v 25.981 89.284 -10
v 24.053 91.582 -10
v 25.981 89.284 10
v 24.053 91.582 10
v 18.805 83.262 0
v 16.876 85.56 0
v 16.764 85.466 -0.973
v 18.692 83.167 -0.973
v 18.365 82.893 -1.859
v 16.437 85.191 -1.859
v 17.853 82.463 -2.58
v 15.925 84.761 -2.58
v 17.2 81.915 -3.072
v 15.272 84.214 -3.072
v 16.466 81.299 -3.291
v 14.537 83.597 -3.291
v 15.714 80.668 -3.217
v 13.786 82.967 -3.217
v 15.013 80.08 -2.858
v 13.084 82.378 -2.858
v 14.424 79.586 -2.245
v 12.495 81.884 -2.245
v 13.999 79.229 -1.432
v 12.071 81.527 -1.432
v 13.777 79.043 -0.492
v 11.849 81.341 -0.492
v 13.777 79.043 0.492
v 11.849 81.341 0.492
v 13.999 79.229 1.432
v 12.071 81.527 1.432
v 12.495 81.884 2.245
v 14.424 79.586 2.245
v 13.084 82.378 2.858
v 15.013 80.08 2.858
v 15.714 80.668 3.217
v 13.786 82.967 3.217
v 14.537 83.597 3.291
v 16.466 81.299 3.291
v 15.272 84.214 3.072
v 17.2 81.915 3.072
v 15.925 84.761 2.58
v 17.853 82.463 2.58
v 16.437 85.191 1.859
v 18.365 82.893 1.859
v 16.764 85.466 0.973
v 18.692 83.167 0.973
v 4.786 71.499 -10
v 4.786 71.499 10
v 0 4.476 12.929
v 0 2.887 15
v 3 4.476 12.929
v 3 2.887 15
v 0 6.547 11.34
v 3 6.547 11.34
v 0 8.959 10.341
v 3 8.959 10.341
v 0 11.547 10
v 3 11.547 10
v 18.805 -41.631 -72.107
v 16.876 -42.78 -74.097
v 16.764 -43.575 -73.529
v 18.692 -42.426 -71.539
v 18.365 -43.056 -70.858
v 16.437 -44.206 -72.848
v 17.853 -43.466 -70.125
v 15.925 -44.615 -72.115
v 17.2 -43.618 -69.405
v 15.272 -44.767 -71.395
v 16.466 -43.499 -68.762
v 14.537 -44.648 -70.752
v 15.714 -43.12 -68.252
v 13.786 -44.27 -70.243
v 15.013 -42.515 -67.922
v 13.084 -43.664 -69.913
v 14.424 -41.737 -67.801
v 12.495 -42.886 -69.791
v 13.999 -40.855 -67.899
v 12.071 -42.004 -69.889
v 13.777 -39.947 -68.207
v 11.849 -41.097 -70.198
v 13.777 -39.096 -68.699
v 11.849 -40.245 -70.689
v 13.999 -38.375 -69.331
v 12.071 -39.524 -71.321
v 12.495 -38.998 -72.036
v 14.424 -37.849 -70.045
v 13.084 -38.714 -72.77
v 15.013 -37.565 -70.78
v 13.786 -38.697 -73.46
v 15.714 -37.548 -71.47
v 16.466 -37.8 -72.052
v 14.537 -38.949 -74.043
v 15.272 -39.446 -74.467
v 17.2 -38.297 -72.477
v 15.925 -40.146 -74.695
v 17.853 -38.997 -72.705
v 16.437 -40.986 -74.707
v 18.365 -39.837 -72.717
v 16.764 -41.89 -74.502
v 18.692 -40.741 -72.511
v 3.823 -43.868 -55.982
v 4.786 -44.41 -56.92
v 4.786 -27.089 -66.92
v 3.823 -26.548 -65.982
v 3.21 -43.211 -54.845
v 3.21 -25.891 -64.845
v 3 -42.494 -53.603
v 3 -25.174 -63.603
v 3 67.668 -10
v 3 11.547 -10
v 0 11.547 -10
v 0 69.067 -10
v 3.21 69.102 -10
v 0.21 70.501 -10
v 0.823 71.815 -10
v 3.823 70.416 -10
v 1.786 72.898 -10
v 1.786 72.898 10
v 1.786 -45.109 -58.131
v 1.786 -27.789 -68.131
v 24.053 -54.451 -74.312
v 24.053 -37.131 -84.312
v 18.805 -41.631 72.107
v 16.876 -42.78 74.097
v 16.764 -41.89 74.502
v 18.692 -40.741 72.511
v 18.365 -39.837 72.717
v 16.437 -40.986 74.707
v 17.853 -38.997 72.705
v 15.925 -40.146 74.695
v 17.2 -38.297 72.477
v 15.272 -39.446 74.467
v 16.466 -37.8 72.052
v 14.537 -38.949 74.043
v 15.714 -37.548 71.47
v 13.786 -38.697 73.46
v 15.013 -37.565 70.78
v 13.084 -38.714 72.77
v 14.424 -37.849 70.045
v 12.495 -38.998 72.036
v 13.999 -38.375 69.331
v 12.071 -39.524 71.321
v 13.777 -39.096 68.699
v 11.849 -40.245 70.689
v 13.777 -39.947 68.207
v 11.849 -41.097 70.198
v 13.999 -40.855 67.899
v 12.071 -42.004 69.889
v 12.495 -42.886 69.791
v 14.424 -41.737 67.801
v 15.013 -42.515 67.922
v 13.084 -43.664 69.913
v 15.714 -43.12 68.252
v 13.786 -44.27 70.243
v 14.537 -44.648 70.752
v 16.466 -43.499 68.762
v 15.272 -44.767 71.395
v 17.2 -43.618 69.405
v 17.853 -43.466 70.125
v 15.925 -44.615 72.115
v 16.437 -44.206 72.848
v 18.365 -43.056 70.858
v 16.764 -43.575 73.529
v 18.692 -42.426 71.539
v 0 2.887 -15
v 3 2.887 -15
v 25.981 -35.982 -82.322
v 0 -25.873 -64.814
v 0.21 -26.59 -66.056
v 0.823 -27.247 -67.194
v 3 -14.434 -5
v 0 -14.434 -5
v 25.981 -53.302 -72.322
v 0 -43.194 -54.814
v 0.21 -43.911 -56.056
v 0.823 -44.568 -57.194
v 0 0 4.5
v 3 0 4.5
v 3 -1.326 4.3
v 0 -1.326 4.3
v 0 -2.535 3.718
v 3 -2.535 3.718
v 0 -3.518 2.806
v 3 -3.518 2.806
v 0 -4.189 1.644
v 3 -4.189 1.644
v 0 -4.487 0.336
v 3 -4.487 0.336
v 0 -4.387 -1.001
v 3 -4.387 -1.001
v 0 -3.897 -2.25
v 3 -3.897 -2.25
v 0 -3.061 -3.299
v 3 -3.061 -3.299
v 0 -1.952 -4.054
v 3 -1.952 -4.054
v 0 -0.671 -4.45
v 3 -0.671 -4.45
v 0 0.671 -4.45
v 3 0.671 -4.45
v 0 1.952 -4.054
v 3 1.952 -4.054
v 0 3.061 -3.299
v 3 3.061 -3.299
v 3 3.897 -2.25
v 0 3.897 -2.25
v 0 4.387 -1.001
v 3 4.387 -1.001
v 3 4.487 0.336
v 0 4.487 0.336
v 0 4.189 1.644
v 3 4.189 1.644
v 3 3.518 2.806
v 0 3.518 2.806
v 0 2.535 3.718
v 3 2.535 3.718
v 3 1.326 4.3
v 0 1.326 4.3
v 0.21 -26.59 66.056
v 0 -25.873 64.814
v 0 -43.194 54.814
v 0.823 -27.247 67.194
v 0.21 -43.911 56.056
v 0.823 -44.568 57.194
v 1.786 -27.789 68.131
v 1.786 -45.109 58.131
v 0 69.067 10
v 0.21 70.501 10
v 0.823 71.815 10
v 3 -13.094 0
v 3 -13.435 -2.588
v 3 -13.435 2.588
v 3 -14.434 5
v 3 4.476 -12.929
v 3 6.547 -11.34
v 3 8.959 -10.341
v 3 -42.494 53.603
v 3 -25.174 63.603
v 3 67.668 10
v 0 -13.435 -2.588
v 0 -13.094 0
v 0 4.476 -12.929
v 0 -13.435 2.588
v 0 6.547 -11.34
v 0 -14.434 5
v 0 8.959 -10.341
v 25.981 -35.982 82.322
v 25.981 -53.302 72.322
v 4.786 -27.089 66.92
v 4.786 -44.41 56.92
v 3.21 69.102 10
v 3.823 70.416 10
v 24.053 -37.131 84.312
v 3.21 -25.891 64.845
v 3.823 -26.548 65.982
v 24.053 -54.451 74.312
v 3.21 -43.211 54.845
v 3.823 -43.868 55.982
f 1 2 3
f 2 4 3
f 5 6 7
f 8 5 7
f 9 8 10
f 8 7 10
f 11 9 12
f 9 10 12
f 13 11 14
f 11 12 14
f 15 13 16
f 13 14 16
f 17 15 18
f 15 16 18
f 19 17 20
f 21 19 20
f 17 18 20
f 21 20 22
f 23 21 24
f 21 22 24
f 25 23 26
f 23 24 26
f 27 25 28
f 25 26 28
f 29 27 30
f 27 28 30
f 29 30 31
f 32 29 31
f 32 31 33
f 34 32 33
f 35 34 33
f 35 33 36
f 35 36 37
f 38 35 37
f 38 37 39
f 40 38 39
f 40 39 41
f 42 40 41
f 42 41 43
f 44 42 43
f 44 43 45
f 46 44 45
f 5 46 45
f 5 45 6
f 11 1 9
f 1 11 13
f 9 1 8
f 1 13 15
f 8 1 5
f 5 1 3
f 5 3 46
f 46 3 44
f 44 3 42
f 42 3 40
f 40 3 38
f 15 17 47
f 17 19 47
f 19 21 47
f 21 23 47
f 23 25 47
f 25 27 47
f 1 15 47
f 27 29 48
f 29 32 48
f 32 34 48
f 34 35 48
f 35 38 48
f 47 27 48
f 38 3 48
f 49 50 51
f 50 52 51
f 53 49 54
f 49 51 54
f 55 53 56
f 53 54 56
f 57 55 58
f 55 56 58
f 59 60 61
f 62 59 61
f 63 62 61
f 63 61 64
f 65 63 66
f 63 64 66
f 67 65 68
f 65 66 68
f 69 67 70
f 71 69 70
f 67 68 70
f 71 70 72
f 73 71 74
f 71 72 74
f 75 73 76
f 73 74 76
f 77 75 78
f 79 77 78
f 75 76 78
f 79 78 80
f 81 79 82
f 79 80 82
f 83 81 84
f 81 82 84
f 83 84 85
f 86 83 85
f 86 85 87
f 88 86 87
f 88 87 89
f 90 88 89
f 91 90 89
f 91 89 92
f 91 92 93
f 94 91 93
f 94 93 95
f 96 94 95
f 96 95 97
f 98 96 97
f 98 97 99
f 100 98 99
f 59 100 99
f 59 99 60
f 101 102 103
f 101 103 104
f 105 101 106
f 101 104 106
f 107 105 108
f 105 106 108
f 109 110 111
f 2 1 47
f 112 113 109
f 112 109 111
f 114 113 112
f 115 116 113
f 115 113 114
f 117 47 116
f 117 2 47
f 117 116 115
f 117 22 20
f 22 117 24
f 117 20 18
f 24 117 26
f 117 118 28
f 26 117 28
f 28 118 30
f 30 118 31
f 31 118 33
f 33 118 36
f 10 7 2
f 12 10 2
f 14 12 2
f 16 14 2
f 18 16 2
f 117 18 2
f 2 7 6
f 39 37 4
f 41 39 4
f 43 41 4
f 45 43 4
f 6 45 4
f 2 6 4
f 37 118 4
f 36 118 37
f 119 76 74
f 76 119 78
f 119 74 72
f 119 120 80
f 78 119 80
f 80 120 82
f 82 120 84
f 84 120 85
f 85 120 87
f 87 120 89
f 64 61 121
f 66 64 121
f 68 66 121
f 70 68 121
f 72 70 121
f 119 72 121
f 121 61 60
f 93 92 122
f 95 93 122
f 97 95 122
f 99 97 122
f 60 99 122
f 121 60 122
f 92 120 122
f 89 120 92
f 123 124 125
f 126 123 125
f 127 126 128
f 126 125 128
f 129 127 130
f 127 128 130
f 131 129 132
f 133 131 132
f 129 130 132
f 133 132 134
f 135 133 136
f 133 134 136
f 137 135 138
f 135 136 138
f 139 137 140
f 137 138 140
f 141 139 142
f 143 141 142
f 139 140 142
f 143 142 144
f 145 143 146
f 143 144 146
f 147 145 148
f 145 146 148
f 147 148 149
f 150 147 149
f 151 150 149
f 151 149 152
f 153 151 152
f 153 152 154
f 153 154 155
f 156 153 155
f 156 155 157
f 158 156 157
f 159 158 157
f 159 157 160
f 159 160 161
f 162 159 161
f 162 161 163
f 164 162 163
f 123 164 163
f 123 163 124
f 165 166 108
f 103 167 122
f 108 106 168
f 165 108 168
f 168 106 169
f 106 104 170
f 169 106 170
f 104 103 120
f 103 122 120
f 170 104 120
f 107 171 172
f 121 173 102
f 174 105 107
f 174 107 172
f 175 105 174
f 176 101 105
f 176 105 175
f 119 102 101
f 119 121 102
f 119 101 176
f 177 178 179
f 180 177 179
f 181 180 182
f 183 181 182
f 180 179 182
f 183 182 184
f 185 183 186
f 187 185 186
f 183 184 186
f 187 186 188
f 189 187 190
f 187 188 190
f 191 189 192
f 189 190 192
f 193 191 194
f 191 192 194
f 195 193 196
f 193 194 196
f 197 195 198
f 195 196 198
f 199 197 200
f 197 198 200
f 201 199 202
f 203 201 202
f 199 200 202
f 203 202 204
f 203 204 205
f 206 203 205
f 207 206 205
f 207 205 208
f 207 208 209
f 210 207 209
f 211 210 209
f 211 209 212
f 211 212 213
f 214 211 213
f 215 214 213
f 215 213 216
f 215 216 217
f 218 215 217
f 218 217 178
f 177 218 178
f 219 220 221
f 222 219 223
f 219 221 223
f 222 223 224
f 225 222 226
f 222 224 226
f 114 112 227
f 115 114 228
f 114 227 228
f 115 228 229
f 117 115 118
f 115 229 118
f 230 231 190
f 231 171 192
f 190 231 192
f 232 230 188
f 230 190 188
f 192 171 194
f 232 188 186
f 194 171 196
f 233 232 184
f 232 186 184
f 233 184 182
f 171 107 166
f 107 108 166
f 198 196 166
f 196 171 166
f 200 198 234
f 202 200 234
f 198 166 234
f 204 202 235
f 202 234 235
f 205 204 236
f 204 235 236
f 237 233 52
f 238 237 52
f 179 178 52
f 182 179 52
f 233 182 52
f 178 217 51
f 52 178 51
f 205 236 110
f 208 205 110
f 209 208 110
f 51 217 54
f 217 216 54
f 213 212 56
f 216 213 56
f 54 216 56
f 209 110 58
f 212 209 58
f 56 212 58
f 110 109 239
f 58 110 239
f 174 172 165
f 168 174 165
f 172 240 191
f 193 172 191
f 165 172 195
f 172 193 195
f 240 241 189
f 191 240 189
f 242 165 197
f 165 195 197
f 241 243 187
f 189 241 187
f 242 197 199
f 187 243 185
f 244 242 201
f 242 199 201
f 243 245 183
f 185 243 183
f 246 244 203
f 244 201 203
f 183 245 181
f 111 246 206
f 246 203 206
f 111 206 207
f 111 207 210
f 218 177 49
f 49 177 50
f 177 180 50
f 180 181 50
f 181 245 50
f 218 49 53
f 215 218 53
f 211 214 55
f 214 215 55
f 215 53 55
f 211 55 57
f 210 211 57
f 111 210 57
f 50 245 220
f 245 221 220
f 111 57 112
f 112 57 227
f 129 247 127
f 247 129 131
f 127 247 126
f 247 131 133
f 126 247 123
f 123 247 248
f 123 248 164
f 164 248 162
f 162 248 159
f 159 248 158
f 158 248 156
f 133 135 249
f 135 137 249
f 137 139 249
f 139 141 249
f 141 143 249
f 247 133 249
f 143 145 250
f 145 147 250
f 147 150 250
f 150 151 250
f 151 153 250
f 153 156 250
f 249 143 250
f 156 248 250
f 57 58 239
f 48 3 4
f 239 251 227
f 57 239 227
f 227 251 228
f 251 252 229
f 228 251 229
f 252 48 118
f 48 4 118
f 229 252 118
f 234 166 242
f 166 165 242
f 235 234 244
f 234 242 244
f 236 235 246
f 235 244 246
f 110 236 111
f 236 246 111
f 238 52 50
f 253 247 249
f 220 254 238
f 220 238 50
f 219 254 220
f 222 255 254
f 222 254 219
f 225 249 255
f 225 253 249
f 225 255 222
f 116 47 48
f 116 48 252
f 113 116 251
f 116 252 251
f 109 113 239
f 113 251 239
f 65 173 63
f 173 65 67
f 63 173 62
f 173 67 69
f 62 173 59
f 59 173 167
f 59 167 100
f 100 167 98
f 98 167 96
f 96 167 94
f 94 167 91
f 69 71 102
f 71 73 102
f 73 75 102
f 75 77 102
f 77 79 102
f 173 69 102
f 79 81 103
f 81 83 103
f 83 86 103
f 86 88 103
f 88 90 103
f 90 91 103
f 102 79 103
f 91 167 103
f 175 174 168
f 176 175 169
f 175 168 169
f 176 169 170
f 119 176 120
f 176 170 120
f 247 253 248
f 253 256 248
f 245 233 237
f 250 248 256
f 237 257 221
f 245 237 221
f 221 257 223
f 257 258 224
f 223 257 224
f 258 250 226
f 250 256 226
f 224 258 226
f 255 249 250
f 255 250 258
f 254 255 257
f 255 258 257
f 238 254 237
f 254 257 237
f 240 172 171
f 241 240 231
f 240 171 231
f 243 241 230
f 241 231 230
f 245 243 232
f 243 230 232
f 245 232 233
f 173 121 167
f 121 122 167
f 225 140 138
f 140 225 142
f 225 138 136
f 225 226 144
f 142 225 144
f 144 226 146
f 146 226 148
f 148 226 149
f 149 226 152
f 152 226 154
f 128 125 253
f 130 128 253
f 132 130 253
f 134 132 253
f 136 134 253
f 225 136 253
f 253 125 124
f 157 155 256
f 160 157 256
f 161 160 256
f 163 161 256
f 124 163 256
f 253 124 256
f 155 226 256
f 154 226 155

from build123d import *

# Parameters (mm, degrees)
EXTRUDE_1_DEPTH          = 10
PATTERN_CIRCULAR_1_COUNT = 3
FILLET_2_R               = 10
HOLE_WIZARD_M82_D        = 9
HOLE_WIZARD_M61_D        = 6.6
PATTERN_CIRCULAR_2_COUNT = 3


with BuildPart() as part:
    # Эскиз1 → Бобышка-Вытянуть1 (new, symmetric)
    with BuildSketch(Plane.XY):
        with BuildLine():
            Line((0, 0), (0, 69.067384684))
            ThreePointArc((0, 69.067384684), (0.468461065, 71.180475992), (1.786061952, 72.897606899))
            Line((1.786061952, 72.897606899), (24.052970465, 91.58176162))
            Line((24.052970465, 91.58176162), (25.981333294, 89.283628291))
            Line((25.981333294, 89.283628291), (4.786061952, 71.498683925))
            ThreePointArc((4.786061952, 71.498683925), (3.468461065, 69.781553018), (3, 67.668461709))
            Line((3, 67.668461709), (3, 0))
            Line((3, 0), (0, 0))
        make_face()
    extrude_1 = extrude(amount=EXTRUDE_1_DEPTH, both=True)

    # Круговой массив1: Бобышка-Вытянуть1 ×3 about axis
    pattern_circular_1_axis = Axis((-26.581598466, 0, 0), (1, 0, 0))
    for i in range(1, PATTERN_CIRCULAR_1_COUNT):
        add(extrude_1.rotate(pattern_circular_1_axis, i * 360 / PATTERN_CIRCULAR_1_COUNT))

    # Скругление2
    fillet_2_edges = [part.edges().sort_by_distance(p)[0] for p in [
        (1.5, 5.773502692, 10),
        (1.5, -11.547005384, 0),
        (1.5, 5.773502692, -10),
    ]]
    fillet(fillet_2_edges, radius=FILLET_2_R)

    # Отверстие с зазором M82 (through all)
    with Locations(Plane(origin=(0, 0, 0), x_dir=(0, 0, -1), z_dir=(-1, 0, 0))):
        with Locations((0, 0)):
            Hole(HOLE_WIZARD_M82_D / 2)

    # Отверстие с зазором M61 (through all)
    with Locations(Plane(origin=(16.276728598, 81.14049807, 0), x_dir=(-0.766044443119, -0.642787609687, 0), z_dir=(0.642787609687, -0.766044443119, 0))):
        with Locations((0, 0)):
            hole_wizard_m61 = Hole(HOLE_WIZARD_M61_D / 2)

    # Круговой массив2: Отверстие с зазором M61 ×3 about axis
    pattern_circular_2_axis = Axis((22.676850282, 0, 0), (-1, 0, 0))
    for i in range(1, PATTERN_CIRCULAR_2_COUNT):
        add(hole_wizard_m61.rotate(pattern_circular_2_axis, i * 360 / PATTERN_CIRCULAR_2_COUNT), mode=Mode.SUBTRACT)


solid = part.part
